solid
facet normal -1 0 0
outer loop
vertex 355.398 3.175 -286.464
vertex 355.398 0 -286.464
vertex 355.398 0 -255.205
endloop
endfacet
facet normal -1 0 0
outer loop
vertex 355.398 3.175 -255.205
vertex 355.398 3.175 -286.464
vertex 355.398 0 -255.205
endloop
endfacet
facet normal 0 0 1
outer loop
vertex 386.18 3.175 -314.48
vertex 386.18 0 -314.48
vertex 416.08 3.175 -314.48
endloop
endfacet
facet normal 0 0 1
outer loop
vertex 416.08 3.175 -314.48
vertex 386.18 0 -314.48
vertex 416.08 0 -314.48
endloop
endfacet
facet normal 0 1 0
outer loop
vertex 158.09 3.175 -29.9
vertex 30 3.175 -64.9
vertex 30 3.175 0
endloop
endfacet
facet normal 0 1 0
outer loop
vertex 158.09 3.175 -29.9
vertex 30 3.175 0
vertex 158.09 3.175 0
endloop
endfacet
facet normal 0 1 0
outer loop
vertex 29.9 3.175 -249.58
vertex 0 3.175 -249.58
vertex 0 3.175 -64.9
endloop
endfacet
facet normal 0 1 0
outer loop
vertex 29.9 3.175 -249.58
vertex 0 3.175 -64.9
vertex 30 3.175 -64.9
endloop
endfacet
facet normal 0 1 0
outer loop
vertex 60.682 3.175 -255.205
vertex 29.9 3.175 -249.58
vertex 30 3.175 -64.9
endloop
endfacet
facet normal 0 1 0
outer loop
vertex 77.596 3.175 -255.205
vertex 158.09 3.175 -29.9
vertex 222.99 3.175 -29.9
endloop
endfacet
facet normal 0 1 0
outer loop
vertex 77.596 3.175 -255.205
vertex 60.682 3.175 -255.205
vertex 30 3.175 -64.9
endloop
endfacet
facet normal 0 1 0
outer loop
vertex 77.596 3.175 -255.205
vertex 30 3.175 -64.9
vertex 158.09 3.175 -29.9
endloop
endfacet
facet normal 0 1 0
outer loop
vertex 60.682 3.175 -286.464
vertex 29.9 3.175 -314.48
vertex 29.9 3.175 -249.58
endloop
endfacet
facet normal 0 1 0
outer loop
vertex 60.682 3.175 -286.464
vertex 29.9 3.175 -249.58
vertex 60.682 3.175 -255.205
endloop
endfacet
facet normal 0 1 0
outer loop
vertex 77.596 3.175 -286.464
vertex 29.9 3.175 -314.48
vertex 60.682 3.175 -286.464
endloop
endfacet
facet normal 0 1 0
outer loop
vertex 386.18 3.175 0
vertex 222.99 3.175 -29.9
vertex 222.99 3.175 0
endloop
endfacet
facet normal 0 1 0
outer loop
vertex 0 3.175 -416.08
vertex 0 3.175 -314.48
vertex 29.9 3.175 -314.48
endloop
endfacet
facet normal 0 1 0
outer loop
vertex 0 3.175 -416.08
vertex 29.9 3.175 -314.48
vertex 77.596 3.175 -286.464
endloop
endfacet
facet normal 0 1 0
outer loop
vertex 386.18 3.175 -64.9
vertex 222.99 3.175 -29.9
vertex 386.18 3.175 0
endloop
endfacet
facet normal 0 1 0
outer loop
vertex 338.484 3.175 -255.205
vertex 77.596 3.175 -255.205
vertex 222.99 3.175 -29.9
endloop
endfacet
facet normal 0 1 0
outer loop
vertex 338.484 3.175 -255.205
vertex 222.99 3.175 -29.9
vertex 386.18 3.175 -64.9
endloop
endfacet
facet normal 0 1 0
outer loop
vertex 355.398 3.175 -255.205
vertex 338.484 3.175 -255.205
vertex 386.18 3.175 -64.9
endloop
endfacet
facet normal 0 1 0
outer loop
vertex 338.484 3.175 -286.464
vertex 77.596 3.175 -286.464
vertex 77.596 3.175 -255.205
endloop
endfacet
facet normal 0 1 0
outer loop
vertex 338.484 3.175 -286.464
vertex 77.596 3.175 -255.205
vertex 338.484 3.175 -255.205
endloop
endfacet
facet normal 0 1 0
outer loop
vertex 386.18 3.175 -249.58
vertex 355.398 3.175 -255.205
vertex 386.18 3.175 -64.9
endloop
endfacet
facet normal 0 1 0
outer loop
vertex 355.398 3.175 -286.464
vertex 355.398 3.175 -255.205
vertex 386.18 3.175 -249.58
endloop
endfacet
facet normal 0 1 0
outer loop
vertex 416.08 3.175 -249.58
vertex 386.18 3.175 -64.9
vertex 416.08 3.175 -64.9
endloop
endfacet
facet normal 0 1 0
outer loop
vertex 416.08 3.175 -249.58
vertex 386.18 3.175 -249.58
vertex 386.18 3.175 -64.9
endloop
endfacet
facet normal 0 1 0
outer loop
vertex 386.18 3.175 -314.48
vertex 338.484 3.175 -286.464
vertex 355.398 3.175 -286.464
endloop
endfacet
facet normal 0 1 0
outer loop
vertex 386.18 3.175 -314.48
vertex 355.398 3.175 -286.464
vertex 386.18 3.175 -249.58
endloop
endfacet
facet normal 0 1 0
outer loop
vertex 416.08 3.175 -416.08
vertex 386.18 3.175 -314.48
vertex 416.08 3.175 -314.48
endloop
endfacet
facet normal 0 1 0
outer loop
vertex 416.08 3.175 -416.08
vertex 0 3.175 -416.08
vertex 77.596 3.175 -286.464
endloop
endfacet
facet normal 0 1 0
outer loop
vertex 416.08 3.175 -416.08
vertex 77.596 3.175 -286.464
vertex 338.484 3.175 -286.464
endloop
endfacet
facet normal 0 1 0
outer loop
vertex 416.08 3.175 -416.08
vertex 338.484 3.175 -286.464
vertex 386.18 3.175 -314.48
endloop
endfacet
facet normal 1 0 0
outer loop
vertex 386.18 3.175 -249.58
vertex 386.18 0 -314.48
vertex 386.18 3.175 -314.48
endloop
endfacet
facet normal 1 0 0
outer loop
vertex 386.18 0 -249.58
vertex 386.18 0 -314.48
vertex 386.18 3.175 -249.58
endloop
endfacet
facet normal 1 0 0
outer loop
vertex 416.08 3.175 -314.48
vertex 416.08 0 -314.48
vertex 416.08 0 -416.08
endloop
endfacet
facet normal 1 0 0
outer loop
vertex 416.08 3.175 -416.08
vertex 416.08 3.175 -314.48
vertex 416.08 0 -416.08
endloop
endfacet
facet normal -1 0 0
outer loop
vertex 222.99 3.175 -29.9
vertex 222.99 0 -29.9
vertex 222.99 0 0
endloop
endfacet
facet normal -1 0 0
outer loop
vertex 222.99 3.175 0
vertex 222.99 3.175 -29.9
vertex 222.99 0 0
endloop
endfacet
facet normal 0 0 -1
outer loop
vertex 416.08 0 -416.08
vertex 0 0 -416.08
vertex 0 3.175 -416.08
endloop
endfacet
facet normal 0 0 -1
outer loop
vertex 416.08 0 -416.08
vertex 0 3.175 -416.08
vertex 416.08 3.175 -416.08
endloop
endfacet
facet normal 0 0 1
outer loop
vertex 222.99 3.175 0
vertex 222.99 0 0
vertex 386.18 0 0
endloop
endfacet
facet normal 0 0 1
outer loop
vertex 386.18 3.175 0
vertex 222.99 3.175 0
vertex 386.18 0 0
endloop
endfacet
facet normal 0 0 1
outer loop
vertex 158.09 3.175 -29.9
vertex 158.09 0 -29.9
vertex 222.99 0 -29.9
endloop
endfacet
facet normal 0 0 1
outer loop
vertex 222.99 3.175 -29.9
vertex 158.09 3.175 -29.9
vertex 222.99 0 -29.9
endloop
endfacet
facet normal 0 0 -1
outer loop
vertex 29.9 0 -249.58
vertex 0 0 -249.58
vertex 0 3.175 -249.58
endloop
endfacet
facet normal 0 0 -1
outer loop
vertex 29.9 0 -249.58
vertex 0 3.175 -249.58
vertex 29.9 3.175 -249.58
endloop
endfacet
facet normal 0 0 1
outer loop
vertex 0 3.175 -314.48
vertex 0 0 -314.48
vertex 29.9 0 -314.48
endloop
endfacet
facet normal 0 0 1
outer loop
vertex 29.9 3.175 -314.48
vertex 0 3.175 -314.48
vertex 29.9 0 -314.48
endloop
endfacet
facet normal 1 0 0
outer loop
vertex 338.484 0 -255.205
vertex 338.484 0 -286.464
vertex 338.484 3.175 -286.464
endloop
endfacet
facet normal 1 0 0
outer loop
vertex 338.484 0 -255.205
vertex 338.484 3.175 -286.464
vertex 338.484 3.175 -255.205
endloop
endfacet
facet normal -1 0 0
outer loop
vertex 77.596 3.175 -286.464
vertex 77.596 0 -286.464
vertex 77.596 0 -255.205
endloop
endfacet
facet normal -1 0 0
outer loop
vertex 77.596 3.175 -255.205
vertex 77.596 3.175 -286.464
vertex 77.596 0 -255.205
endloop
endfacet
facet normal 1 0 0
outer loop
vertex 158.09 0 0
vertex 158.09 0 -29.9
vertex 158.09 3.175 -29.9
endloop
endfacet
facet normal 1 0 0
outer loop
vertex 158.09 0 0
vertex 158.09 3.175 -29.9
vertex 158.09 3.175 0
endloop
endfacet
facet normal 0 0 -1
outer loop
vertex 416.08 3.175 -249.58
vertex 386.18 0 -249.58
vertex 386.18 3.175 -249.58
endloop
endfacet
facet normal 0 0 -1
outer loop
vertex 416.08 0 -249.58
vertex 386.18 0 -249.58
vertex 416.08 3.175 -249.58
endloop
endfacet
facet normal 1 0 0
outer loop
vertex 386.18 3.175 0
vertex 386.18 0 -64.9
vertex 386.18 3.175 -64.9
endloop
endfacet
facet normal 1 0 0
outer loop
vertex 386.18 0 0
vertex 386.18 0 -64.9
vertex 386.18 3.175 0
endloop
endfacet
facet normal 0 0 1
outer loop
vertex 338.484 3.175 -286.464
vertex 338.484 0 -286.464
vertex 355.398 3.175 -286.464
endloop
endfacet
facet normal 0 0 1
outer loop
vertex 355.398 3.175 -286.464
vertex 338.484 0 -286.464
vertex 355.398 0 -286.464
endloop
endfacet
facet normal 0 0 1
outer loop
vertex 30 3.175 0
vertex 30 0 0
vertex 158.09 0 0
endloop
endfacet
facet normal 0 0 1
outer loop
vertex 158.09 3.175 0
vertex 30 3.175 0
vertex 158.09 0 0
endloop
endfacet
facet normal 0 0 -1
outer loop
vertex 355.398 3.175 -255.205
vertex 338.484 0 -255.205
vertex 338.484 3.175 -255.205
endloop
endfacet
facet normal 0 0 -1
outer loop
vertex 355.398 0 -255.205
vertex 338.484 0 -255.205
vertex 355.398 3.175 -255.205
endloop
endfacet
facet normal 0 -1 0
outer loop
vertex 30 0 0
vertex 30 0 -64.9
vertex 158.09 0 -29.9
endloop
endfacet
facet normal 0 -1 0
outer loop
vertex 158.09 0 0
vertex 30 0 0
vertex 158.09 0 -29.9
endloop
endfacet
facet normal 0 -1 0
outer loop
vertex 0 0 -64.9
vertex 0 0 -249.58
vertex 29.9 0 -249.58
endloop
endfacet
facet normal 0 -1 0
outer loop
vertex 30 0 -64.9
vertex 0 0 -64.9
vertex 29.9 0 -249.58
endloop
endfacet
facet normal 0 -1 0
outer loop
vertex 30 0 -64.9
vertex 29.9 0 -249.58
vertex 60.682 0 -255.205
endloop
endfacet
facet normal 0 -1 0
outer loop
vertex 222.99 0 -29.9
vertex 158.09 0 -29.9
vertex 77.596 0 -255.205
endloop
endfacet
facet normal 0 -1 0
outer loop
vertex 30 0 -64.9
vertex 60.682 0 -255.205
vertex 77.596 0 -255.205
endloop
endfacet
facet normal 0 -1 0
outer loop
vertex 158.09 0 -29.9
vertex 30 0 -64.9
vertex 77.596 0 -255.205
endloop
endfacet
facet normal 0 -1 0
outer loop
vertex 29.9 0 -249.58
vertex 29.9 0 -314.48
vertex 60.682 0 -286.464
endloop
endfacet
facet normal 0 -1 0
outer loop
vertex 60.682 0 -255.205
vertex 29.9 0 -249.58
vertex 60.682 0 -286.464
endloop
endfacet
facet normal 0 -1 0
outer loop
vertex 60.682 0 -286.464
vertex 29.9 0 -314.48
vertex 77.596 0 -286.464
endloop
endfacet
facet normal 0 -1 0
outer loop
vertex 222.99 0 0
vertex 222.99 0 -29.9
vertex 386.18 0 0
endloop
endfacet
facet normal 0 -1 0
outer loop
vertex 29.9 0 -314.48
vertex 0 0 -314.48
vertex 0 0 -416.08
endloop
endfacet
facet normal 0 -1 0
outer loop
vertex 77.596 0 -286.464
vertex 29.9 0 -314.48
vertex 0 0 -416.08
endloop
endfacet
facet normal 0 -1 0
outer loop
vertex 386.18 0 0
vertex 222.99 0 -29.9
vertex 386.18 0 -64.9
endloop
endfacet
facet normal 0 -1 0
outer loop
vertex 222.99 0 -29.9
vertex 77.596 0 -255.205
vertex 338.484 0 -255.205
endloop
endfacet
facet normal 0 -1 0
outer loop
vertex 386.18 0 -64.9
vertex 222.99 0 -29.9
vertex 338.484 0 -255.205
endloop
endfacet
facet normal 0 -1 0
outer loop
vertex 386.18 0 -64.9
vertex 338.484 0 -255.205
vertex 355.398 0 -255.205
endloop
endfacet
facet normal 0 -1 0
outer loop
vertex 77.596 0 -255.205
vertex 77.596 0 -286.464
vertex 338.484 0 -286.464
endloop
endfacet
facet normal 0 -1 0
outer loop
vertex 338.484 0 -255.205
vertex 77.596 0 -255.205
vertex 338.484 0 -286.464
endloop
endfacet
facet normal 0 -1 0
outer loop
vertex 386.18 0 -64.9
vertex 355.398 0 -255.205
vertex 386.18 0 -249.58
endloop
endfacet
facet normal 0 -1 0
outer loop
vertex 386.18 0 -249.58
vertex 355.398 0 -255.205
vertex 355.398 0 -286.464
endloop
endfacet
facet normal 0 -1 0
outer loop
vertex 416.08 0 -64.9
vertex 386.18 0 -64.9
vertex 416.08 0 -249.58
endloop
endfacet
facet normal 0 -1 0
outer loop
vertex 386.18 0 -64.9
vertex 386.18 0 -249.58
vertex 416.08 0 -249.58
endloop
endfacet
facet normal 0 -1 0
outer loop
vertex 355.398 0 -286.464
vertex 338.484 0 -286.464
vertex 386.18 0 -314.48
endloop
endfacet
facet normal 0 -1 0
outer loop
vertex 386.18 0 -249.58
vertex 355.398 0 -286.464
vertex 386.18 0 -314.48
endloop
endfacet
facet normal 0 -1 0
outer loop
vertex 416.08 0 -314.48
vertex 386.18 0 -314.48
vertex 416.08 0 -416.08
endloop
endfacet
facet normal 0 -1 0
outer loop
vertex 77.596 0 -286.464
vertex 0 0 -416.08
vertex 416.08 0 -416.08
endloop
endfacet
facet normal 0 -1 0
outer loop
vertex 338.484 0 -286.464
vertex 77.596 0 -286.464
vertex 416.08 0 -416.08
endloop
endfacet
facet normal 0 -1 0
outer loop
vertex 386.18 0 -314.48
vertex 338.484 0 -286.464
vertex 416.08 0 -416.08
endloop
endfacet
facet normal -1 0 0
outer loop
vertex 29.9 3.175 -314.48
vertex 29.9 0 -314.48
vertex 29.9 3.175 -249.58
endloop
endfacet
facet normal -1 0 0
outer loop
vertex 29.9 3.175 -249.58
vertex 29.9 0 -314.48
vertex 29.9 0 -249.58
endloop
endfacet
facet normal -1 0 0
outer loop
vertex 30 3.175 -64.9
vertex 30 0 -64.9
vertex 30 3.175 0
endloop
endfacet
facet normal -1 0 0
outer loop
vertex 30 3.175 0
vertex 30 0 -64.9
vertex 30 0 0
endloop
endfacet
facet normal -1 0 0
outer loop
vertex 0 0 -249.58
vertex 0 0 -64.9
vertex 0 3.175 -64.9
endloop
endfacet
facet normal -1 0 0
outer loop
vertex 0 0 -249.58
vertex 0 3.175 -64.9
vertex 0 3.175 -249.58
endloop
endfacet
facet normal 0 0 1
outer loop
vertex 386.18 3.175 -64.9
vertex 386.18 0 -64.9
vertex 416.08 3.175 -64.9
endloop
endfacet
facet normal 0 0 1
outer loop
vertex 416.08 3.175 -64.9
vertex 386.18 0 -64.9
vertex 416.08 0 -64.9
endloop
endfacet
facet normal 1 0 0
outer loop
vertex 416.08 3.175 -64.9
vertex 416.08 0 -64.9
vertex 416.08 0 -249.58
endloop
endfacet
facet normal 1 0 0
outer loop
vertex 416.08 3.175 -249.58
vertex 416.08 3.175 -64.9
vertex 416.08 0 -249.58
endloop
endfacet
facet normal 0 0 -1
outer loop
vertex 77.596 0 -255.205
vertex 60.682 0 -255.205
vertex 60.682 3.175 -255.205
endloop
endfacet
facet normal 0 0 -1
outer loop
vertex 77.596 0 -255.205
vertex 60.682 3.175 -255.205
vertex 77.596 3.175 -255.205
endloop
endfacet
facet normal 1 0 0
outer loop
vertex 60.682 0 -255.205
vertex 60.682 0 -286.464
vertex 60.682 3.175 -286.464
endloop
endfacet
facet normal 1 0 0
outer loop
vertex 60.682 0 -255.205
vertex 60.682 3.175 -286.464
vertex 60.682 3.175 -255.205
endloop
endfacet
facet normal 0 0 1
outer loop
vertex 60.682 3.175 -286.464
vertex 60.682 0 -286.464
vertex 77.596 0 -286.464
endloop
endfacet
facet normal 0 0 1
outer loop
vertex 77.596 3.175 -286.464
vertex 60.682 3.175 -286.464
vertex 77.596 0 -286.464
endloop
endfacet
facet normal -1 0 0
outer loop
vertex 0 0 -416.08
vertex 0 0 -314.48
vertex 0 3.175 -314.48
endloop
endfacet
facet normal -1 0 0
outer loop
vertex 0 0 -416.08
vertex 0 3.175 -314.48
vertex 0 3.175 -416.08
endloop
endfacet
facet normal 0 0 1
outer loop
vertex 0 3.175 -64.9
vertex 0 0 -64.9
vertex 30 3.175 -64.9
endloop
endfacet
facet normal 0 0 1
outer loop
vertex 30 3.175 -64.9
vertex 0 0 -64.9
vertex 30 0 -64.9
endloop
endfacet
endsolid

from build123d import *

# Parameters (mm, degrees)
SKETCH1_W           = 416.08
SKETCH1_H           = 416.08
BOSS_EXTRUDE1_DEPTH = 3.175
SKETCH4_W           = 16.914306981
SKETCH4_H           = 31.258998707
SKETCH4_W_2         = 29.9
SKETCH4_H_2         = 64.9
SKETCH4_W_3         = 64.9
SKETCH4_H_3         = 29.9
SKETCH4_W_4         = 30
CUT_EXTRUDE3_DEPTH  = 4.175


with BuildPart() as part:
    # Sketch1 → Boss-Extrude1 (new body)
    with BuildSketch(Plane(origin=(0, 0, 0), x_dir=(1, 0, 0), z_dir=(0, 1, 0))):
        with Locations((208.04, 208.04)):
            Rectangle(SKETCH1_W, SKETCH1_H)
    extrude(amount=BOSS_EXTRUDE1_DEPTH)

    # Sketch4 → Cut-Extrude3 (cut, through all)
    with BuildSketch(Plane.XZ):
        with Locations((69.139038516, -270.834733378)):
            Rectangle(SKETCH4_W, SKETCH4_H)
        with Locations((346.940961485, -270.834733378)):
            Rectangle(SKETCH4_W, SKETCH4_H)
        with Locations((401.13, -32.45)):
            Rectangle(SKETCH4_W_2, SKETCH4_H_2)
        with Locations((190.54, -14.95)):
            Rectangle(SKETCH4_W_3, SKETCH4_H_3)
        with Locations((15, -32.45)):
            Rectangle(SKETCH4_W_4, SKETCH4_H_2)
        with Locations((14.95, -282.03)):
            Rectangle(SKETCH4_W_2, SKETCH4_H_2)
        with Locations((401.13, -282.03)):
            Rectangle(SKETCH4_W_2, SKETCH4_H_2)
    extrude(amount=-CUT_EXTRUDE3_DEPTH, mode=Mode.SUBTRACT)


solid = part.part
